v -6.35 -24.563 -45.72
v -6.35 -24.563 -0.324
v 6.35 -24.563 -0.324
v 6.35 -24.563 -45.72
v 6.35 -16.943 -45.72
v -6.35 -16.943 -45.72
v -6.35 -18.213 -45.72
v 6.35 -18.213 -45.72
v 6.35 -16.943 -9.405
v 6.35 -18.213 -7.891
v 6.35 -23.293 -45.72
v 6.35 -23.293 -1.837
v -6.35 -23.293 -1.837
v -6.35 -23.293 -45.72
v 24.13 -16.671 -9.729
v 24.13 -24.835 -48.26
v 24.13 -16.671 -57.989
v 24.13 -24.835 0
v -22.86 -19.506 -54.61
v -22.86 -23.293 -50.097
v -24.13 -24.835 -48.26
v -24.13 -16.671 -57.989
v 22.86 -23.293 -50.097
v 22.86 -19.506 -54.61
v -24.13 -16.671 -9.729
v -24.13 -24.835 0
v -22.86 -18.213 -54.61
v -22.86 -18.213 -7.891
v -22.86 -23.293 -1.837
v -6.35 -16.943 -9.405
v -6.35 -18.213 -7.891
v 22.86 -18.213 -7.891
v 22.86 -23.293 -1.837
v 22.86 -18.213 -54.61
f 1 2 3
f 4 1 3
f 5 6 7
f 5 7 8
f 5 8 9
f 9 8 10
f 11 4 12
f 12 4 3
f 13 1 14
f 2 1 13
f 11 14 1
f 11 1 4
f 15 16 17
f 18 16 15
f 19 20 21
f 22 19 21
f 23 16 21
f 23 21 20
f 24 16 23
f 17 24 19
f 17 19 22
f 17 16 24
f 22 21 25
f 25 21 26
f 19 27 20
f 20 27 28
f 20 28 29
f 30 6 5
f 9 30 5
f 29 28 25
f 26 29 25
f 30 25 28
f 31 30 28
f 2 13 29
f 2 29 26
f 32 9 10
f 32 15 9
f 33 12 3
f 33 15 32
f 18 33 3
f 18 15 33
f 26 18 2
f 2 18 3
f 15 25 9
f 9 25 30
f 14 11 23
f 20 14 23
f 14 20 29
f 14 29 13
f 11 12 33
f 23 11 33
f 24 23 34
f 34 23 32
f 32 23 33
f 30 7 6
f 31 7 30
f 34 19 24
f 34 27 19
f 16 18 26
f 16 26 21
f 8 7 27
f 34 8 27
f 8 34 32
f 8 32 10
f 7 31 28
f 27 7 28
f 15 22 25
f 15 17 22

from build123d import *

# Parameters (mm, degrees)
F1_DEPTH = 24.13
F2_W     = 12.7
F2_H     = 1.27
F3_DEPTH = 45.72
F4_DEPTH = 54.61


with BuildPart() as f1:
    # F0 (on Right) → F1 (new body, symmetric)
    with BuildSketch(Plane.YZ):
        Polygon((-16.67125, -9.728764), (-24.834652, 0), (-24.834652, -48.26), (-16.67125, -57.988764), align=None)
    extrude(amount=F1_DEPTH, both=True)

    # F2 (on Top) → F3 (cut)
    with BuildSketch(Plane.XY):
        with Locations((0, -17.577951)):
            Rectangle(F2_W, F2_H)
        with Locations((0, -23.927951)):
            Rectangle(F2_W, F2_H)
    extrude(amount=-F3_DEPTH, mode=Mode.SUBTRACT)

    # F2 (on Top) → F4 (cut)
    with BuildSketch(Plane.XY):
        Polygon((22.86, -23.292951), (22.86, -18.212951), (6.35, -18.212951), (-6.35, -18.212951), (-22.86, -18.212951), (-22.86, -23.292951), (-6.35, -23.292951), (6.35, -23.292951), align=None)
    extrude(amount=-F4_DEPTH, mode=Mode.SUBTRACT)


solid = f1.part
